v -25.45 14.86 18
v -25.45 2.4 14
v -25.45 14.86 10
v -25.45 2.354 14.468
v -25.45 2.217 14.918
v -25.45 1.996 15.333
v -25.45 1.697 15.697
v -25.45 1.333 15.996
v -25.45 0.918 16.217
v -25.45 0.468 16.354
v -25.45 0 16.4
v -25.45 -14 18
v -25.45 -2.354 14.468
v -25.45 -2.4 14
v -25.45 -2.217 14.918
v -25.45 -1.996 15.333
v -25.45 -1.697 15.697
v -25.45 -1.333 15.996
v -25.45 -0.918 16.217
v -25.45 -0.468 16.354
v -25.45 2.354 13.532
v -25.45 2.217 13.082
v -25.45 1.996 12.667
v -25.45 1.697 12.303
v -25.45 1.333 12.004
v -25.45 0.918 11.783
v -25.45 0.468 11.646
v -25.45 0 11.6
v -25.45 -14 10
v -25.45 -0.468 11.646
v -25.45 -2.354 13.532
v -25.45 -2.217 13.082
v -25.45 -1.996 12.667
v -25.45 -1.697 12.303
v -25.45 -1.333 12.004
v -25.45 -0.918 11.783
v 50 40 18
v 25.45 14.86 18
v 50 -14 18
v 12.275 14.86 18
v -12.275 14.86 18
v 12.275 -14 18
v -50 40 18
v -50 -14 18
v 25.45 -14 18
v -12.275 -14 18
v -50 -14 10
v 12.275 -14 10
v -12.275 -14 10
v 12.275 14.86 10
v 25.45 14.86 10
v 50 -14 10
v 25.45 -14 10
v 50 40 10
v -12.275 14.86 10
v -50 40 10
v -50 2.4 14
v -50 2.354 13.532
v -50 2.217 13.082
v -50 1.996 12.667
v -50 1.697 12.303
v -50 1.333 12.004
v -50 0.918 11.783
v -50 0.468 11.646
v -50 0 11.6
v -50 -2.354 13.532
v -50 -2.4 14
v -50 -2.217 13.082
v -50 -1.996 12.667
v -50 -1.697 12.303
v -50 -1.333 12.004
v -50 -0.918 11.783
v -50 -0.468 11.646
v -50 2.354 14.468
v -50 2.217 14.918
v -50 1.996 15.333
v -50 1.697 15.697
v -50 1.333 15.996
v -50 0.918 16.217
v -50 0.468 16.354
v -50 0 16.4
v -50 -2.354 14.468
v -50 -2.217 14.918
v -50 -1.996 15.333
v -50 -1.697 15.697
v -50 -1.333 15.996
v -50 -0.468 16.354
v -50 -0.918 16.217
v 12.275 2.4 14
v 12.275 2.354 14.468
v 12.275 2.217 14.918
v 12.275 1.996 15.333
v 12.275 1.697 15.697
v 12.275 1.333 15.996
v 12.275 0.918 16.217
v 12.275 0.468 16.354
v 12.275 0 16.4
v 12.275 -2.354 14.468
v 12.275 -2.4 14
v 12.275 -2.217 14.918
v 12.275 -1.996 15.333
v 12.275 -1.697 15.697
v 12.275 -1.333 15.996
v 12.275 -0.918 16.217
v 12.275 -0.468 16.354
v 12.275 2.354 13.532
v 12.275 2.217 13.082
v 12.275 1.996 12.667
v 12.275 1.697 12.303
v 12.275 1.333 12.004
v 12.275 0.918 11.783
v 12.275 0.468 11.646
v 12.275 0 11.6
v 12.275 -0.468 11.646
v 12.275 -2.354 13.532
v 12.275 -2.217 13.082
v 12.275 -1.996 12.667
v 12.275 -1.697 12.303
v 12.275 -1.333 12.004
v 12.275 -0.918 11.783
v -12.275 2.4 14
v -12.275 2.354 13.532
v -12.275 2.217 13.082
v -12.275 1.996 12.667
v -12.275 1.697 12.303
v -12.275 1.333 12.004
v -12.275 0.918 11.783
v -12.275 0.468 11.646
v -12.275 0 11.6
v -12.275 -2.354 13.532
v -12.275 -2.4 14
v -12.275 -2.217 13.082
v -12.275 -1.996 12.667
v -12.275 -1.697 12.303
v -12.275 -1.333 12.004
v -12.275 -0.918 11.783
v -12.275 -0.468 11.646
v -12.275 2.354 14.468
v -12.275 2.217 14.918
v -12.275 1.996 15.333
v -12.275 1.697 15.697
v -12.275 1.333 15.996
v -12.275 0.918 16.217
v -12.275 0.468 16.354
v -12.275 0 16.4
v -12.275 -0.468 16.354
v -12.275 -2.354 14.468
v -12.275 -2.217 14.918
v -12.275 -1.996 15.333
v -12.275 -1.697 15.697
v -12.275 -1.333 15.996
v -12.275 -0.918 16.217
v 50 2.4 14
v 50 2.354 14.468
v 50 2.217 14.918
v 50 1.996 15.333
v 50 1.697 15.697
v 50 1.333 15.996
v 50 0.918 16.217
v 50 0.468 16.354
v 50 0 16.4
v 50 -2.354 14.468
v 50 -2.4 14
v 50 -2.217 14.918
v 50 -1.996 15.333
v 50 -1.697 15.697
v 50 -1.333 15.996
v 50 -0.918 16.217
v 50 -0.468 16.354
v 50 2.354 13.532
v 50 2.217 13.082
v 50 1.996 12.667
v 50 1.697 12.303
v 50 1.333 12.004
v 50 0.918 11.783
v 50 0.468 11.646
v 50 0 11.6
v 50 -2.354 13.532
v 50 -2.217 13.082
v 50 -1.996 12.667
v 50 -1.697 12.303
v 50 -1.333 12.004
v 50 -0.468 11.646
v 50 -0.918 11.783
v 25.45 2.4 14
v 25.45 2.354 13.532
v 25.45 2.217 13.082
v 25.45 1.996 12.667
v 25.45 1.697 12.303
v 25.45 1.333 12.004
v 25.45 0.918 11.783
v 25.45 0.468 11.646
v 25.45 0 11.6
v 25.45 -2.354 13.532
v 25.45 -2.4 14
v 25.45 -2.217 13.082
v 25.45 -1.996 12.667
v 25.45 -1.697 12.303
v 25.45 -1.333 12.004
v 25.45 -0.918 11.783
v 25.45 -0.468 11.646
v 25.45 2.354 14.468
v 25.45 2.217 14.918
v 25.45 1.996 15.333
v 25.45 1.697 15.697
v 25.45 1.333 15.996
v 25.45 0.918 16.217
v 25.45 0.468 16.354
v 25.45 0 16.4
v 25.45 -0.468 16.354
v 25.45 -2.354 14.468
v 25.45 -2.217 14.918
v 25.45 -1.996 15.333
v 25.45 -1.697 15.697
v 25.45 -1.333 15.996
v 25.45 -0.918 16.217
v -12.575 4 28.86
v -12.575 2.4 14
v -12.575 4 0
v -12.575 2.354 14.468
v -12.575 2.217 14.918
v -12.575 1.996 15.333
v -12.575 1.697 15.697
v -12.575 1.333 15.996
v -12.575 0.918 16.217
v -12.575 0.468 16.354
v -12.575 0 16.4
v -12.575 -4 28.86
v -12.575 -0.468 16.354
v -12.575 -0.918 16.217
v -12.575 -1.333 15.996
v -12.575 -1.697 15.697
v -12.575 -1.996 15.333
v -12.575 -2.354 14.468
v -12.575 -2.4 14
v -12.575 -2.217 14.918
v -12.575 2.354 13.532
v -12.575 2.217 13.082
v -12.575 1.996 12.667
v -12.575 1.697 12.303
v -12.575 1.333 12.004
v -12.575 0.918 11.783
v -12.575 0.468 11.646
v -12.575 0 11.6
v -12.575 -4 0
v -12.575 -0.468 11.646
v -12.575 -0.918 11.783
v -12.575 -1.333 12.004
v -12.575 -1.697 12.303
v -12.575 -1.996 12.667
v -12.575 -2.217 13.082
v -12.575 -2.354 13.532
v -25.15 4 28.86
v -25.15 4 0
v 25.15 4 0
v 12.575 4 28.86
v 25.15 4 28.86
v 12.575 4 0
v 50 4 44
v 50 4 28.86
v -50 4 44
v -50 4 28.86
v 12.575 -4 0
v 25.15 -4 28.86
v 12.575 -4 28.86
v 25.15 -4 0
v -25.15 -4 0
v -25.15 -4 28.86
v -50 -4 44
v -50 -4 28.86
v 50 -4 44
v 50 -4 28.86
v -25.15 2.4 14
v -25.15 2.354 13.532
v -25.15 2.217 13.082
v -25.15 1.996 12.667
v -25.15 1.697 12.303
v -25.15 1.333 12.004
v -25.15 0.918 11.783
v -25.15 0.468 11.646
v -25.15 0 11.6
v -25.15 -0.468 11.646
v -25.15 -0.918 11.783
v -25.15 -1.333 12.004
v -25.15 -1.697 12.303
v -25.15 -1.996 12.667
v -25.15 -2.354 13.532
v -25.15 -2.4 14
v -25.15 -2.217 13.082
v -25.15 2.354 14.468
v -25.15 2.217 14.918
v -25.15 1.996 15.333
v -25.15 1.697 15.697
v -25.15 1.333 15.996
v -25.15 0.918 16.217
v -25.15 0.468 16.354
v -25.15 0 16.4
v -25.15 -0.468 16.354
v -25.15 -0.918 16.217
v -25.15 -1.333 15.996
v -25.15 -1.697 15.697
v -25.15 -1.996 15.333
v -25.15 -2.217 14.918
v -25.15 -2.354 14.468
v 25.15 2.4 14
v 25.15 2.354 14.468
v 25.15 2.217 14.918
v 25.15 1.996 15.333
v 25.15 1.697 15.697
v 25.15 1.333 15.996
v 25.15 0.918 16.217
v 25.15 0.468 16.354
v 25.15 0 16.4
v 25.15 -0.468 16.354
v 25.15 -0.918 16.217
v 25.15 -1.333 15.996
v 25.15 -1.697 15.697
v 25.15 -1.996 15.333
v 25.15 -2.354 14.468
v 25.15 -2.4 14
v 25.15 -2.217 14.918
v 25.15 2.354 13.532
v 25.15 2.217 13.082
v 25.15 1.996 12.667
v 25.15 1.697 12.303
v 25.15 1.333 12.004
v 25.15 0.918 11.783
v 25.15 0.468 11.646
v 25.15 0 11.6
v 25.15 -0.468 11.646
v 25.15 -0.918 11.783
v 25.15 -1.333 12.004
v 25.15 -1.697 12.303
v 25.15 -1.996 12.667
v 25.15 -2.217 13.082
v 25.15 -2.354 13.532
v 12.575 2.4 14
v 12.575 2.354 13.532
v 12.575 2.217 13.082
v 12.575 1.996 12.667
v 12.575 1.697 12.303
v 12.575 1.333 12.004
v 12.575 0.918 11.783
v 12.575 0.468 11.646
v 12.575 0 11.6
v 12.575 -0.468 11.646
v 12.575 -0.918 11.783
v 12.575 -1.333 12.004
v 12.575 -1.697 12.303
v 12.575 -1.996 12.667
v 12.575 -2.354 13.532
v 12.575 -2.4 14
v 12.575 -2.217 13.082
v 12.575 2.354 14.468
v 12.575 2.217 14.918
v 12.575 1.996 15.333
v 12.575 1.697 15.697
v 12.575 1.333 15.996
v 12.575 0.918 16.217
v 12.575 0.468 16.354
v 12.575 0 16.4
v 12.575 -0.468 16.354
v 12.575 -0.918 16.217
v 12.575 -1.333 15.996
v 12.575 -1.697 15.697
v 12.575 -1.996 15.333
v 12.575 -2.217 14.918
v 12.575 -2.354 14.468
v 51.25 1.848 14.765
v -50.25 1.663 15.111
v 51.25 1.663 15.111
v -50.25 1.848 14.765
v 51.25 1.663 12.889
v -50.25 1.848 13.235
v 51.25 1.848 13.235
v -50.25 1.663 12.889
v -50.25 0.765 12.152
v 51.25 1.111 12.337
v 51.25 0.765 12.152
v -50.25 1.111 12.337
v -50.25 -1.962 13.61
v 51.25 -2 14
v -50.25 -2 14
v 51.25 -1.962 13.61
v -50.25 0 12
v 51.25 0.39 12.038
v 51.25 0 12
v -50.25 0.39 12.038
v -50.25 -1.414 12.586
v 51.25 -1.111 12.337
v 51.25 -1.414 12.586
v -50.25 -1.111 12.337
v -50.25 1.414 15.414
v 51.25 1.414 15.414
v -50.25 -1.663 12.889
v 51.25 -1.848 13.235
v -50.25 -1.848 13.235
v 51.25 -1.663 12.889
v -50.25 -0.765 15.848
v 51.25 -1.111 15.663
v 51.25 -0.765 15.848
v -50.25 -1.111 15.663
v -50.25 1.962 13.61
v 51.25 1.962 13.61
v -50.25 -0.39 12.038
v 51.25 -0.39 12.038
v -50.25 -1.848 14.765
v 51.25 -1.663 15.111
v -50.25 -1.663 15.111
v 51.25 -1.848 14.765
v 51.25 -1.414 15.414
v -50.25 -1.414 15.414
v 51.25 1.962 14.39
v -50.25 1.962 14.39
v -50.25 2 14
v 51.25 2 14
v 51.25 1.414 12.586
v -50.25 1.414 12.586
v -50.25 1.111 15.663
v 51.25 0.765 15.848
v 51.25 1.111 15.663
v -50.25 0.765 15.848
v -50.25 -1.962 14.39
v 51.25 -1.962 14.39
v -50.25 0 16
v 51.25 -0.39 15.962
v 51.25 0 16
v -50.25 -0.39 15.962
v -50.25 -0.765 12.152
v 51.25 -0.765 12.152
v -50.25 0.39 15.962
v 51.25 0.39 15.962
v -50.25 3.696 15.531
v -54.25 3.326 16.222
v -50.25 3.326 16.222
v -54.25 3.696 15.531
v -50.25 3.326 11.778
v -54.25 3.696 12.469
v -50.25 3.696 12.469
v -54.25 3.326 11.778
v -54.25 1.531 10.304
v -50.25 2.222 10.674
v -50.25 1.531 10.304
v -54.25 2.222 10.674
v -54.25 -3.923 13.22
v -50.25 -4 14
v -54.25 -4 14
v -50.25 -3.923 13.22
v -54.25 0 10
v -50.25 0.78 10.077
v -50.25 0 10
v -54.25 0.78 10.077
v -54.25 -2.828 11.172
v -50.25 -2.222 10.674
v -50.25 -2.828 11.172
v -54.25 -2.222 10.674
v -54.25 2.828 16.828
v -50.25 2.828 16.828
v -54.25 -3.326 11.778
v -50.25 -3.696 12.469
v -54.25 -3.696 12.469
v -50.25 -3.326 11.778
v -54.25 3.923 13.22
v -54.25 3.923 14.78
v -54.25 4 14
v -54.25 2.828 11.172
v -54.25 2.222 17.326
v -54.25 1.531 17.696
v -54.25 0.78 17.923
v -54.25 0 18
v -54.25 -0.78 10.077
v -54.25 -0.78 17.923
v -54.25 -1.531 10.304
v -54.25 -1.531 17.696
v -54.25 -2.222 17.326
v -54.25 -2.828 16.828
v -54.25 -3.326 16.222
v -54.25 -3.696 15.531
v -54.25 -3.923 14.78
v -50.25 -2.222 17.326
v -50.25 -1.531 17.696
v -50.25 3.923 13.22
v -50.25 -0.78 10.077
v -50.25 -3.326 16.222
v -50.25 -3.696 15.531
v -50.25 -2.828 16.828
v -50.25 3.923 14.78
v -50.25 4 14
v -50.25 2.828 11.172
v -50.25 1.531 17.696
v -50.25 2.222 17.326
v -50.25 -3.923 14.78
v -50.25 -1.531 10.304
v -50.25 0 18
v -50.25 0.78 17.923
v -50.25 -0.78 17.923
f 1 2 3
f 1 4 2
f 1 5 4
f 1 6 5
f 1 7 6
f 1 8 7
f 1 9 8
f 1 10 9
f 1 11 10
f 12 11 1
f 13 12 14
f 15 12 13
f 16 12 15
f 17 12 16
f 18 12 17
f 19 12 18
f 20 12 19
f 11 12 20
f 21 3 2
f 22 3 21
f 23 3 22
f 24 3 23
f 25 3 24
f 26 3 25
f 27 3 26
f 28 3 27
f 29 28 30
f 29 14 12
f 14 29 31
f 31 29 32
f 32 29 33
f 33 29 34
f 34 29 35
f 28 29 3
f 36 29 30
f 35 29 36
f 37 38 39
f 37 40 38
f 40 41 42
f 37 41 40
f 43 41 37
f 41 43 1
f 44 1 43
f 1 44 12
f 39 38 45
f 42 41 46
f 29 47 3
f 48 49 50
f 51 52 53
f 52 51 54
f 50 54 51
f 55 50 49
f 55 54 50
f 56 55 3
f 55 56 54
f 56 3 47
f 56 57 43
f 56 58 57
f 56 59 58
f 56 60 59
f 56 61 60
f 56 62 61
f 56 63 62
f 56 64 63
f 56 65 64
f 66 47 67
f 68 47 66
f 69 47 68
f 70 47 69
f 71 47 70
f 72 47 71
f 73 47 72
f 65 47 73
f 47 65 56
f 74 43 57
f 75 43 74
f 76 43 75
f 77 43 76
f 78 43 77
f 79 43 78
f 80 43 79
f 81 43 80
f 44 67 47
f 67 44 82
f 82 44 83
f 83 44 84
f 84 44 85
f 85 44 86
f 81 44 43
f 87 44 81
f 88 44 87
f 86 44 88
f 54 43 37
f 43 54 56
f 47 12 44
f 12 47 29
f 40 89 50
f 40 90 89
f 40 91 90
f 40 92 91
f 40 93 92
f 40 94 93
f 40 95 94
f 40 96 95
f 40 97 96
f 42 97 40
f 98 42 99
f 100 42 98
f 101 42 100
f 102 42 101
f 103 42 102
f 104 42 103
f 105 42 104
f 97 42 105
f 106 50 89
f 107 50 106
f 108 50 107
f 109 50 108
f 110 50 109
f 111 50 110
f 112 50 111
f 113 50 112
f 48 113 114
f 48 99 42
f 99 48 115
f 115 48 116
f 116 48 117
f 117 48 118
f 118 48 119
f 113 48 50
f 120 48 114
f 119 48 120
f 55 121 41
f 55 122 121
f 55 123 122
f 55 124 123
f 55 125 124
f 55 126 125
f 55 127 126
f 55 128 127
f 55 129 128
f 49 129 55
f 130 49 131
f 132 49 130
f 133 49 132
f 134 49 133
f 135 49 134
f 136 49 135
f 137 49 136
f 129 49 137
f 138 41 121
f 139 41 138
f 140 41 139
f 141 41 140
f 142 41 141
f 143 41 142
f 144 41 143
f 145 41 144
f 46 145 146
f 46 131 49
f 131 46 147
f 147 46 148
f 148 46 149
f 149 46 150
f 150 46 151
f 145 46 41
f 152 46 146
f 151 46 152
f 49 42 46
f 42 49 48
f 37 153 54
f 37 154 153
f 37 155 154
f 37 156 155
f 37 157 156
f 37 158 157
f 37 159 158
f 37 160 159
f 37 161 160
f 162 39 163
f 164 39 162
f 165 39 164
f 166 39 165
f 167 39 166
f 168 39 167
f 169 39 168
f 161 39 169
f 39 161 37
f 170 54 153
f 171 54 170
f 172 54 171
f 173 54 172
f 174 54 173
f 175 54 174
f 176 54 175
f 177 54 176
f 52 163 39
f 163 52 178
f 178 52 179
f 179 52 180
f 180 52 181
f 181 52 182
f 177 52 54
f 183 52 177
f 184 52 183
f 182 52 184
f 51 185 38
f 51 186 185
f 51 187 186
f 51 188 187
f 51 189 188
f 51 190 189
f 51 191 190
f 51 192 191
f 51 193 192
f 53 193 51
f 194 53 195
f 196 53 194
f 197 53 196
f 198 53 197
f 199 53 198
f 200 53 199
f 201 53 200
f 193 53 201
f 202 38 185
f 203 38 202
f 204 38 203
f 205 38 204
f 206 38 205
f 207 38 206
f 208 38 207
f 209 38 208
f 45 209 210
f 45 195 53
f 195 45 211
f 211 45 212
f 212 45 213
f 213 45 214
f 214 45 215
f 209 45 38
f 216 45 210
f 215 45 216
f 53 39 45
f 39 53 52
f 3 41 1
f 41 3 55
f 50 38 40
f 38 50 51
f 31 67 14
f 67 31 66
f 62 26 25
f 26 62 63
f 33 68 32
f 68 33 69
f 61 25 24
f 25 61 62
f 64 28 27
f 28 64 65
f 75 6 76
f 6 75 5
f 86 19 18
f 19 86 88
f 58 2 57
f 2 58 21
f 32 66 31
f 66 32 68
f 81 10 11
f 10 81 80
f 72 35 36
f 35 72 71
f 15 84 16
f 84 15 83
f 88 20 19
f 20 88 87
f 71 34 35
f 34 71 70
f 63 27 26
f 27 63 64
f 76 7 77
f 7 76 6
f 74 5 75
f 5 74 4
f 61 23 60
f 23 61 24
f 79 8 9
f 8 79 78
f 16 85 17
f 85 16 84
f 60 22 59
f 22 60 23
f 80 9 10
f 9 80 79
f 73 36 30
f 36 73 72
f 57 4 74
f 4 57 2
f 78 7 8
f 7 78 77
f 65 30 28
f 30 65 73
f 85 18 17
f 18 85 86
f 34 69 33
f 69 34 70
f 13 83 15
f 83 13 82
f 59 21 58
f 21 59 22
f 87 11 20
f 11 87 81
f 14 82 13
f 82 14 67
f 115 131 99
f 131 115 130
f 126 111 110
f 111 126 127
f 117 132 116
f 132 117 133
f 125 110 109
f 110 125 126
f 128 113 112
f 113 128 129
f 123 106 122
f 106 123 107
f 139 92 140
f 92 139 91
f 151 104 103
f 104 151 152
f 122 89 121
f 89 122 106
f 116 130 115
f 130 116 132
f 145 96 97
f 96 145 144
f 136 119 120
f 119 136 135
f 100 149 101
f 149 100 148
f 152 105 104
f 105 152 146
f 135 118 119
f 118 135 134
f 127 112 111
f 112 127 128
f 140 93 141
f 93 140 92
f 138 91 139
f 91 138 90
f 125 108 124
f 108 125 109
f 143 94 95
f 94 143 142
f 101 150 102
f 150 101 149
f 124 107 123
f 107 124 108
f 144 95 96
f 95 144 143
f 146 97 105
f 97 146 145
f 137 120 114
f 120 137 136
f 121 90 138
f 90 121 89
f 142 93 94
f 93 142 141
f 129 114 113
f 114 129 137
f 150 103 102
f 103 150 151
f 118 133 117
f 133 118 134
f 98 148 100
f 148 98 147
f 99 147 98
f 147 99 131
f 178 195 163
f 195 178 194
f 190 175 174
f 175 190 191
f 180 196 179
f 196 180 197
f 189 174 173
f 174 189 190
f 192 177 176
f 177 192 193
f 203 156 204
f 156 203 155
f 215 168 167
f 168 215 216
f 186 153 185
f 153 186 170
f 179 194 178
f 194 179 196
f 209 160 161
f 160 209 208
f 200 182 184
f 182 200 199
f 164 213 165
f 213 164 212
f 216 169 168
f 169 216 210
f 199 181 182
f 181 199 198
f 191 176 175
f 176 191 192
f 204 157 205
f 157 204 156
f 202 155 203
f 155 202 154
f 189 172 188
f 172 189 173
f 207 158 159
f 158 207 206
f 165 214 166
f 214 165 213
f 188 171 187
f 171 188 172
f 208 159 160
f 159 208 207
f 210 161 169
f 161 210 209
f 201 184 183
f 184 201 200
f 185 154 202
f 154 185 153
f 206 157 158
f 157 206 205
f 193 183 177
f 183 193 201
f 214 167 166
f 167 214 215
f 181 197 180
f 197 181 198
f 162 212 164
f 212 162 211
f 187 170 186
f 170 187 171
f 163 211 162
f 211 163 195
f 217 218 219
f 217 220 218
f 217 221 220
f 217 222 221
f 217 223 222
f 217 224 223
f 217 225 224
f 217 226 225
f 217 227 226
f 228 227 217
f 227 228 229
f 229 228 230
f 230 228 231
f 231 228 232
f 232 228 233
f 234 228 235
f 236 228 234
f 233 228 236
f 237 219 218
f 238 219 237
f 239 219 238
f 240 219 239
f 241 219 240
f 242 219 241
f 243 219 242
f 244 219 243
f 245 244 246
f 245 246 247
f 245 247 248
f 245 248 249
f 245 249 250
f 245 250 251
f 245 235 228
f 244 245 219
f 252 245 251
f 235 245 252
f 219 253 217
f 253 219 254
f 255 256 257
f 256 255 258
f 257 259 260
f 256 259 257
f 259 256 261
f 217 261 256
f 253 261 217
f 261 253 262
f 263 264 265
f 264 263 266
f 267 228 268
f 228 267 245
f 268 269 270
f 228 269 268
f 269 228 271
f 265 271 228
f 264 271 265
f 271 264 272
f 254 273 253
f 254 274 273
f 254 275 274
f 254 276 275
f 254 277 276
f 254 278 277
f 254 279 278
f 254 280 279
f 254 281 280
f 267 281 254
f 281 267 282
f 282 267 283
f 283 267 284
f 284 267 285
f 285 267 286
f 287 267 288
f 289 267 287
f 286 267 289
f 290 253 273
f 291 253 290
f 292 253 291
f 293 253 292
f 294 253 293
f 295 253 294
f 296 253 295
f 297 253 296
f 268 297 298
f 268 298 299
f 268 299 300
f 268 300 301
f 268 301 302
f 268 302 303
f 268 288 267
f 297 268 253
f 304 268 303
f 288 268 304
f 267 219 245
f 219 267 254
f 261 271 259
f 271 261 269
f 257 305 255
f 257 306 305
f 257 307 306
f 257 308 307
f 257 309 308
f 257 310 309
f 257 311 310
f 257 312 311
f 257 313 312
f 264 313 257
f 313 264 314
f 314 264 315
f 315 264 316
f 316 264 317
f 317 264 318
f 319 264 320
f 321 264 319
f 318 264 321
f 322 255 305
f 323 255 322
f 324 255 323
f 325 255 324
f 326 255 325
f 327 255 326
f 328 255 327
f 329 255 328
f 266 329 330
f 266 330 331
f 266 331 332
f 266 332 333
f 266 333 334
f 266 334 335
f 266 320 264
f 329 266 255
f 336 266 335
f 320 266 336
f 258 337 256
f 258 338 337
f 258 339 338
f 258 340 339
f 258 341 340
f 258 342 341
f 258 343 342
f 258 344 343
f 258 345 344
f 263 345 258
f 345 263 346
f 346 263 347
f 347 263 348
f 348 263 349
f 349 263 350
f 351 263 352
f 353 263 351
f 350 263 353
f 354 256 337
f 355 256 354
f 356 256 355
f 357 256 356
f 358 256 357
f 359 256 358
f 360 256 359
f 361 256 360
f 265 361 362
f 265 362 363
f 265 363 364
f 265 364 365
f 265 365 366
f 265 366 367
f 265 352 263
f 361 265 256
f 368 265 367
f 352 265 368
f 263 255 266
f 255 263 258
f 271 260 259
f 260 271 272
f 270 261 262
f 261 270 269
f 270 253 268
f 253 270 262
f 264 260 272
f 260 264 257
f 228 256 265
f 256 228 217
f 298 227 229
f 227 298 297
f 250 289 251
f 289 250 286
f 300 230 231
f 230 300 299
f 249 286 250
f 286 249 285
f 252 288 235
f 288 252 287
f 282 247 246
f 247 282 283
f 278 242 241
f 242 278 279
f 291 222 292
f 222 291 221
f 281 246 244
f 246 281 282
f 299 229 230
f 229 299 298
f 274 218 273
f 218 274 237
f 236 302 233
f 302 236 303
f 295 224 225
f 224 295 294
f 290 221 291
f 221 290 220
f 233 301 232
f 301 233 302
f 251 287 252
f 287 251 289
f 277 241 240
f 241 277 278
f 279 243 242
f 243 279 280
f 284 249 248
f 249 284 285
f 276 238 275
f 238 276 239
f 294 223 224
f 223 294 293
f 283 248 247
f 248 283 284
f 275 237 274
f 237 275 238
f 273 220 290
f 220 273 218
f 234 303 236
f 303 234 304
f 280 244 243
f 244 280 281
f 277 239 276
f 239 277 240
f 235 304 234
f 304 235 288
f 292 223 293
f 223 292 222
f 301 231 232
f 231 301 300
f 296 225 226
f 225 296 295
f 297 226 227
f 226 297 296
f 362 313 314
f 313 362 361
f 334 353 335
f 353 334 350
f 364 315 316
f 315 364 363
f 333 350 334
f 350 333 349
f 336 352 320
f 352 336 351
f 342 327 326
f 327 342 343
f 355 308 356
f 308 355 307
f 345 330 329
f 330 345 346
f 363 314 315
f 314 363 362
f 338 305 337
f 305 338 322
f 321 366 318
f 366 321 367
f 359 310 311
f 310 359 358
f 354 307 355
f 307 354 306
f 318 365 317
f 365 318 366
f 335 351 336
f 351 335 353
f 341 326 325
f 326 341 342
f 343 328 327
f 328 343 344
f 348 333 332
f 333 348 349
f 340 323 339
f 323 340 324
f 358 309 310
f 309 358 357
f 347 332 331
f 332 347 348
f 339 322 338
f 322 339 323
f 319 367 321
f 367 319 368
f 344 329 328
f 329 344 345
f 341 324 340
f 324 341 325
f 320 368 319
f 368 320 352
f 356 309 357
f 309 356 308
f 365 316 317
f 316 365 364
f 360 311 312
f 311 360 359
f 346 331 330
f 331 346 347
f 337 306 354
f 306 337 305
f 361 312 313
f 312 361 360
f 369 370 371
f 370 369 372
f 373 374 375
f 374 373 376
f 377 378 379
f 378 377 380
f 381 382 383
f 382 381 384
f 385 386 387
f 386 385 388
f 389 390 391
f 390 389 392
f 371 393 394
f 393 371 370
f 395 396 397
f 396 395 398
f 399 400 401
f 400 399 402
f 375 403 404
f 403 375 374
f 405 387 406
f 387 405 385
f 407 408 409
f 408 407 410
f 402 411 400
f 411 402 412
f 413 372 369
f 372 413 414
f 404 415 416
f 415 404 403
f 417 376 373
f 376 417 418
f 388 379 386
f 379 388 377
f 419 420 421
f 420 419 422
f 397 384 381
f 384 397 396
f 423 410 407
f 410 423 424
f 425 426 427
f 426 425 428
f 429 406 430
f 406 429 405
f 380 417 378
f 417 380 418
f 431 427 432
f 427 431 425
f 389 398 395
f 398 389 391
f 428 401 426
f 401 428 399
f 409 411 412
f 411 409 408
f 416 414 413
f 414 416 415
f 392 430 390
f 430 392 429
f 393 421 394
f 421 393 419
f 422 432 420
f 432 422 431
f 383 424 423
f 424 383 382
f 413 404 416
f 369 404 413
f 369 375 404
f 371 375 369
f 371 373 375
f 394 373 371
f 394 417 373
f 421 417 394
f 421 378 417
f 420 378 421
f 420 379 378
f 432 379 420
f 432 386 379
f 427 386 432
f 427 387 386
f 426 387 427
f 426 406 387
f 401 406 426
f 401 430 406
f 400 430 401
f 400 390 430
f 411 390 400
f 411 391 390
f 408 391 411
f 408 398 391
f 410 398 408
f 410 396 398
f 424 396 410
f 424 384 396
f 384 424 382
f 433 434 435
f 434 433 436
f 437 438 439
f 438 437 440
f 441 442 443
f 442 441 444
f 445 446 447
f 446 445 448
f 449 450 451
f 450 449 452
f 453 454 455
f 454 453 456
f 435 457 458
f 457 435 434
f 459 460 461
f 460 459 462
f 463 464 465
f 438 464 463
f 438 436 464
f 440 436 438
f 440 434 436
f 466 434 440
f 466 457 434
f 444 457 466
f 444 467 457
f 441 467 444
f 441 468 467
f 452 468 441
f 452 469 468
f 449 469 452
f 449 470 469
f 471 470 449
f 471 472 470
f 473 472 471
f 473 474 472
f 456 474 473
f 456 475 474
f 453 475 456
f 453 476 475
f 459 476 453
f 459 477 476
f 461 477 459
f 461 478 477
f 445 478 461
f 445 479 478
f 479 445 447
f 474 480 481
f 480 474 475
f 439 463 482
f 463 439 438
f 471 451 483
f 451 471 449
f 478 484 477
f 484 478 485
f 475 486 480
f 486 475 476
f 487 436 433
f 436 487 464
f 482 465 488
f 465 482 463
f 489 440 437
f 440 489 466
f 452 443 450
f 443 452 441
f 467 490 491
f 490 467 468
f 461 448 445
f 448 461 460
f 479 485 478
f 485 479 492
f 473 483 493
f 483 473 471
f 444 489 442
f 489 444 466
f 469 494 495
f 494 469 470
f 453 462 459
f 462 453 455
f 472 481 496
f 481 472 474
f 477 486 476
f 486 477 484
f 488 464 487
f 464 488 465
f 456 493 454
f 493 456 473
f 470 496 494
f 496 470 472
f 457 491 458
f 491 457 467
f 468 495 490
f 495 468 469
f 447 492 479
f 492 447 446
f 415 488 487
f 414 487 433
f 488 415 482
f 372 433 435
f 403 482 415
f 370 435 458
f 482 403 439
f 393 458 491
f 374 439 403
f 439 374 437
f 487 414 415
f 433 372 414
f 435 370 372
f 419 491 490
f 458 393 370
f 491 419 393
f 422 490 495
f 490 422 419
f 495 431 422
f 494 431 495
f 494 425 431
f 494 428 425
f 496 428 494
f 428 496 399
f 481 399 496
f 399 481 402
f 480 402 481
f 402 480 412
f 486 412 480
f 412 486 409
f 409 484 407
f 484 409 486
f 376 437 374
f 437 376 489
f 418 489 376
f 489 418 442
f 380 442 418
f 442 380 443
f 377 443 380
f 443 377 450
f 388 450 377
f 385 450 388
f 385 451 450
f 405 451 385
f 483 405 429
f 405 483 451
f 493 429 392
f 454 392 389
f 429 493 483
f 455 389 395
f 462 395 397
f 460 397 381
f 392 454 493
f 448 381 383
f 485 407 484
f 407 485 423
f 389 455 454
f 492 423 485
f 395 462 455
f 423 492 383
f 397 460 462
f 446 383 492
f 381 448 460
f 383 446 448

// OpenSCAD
$fn = 32;

// ------------------------------------------------------------------------
// Butt hinge: hinge 100 mm, leaf swung 270 deg
// Every part is its own module, assembly() places every instance.
// ------------------------------------------------------------------------

// --- part 1 ---
module hinge_base() {
  difference() {
    union() {
      translate([-50, -14, -4]) cube([24.55, 54, 8]);
      translate([-12.275, -14, -4]) cube([24.55, 54, 8]);
      translate([25.45, -14, -4]) cube([24.55, 54, 8]);
      translate([-50, 14.86, -4]) cube([100, 25.14, 8]);
    }
    translate([-37.725, 0, 0]) rotate([0, 90, 0]) cylinder(h = 26.55, d = 4.8, center = true);
    translate([0, 0, 0]) rotate([0, 90, 0]) cylinder(h = 26.55, d = 4.8, center = true);
    translate([37.725, 0, 0]) rotate([0, 90, 0]) cylinder(h = 26.55, d = 4.8, center = true);
  }
}

// --- part 2 ---
module hinge_mover() {
  difference() {
    union() {
      translate([-25.15, -30, -4]) cube([12.575, 44, 8]);
      translate([12.575, -30, -4]) cube([12.575, 44, 8]);
      translate([-50, -30, -4]) cube([100, 15.14, 8]);
    }
    translate([-18.863, 0, 0]) rotate([0, 90, 0]) cylinder(h = 14.575, d = 4.8, center = true);
    translate([18.863, 0, 0]) rotate([0, 90, 0]) cylinder(h = 14.575, d = 4.8, center = true);
  }
}

// --- part 3 ---
module hinge_pin() {
  rotate([0, 90, 0]) cylinder(h = 102.5, d = 4, center = true);
  translate([-54.25, 0, 0]) rotate([0, 90, 0]) cylinder(h = 4, d = 8);
}

// --- assembly ---
module assembly() {
  color([0.80, 0.24, 0.20]) translate([0, 0, 14]) rotate([0, 0, 0]) hinge_base();
  color([0.20, 0.45, 0.75]) translate([0, 0, 14]) rotate([270, 0, 0]) hinge_mover();
  color([0.25, 0.62, 0.32]) translate([0, 0, 14]) rotate([0, 0, 0]) hinge_pin();
}

assembly();
